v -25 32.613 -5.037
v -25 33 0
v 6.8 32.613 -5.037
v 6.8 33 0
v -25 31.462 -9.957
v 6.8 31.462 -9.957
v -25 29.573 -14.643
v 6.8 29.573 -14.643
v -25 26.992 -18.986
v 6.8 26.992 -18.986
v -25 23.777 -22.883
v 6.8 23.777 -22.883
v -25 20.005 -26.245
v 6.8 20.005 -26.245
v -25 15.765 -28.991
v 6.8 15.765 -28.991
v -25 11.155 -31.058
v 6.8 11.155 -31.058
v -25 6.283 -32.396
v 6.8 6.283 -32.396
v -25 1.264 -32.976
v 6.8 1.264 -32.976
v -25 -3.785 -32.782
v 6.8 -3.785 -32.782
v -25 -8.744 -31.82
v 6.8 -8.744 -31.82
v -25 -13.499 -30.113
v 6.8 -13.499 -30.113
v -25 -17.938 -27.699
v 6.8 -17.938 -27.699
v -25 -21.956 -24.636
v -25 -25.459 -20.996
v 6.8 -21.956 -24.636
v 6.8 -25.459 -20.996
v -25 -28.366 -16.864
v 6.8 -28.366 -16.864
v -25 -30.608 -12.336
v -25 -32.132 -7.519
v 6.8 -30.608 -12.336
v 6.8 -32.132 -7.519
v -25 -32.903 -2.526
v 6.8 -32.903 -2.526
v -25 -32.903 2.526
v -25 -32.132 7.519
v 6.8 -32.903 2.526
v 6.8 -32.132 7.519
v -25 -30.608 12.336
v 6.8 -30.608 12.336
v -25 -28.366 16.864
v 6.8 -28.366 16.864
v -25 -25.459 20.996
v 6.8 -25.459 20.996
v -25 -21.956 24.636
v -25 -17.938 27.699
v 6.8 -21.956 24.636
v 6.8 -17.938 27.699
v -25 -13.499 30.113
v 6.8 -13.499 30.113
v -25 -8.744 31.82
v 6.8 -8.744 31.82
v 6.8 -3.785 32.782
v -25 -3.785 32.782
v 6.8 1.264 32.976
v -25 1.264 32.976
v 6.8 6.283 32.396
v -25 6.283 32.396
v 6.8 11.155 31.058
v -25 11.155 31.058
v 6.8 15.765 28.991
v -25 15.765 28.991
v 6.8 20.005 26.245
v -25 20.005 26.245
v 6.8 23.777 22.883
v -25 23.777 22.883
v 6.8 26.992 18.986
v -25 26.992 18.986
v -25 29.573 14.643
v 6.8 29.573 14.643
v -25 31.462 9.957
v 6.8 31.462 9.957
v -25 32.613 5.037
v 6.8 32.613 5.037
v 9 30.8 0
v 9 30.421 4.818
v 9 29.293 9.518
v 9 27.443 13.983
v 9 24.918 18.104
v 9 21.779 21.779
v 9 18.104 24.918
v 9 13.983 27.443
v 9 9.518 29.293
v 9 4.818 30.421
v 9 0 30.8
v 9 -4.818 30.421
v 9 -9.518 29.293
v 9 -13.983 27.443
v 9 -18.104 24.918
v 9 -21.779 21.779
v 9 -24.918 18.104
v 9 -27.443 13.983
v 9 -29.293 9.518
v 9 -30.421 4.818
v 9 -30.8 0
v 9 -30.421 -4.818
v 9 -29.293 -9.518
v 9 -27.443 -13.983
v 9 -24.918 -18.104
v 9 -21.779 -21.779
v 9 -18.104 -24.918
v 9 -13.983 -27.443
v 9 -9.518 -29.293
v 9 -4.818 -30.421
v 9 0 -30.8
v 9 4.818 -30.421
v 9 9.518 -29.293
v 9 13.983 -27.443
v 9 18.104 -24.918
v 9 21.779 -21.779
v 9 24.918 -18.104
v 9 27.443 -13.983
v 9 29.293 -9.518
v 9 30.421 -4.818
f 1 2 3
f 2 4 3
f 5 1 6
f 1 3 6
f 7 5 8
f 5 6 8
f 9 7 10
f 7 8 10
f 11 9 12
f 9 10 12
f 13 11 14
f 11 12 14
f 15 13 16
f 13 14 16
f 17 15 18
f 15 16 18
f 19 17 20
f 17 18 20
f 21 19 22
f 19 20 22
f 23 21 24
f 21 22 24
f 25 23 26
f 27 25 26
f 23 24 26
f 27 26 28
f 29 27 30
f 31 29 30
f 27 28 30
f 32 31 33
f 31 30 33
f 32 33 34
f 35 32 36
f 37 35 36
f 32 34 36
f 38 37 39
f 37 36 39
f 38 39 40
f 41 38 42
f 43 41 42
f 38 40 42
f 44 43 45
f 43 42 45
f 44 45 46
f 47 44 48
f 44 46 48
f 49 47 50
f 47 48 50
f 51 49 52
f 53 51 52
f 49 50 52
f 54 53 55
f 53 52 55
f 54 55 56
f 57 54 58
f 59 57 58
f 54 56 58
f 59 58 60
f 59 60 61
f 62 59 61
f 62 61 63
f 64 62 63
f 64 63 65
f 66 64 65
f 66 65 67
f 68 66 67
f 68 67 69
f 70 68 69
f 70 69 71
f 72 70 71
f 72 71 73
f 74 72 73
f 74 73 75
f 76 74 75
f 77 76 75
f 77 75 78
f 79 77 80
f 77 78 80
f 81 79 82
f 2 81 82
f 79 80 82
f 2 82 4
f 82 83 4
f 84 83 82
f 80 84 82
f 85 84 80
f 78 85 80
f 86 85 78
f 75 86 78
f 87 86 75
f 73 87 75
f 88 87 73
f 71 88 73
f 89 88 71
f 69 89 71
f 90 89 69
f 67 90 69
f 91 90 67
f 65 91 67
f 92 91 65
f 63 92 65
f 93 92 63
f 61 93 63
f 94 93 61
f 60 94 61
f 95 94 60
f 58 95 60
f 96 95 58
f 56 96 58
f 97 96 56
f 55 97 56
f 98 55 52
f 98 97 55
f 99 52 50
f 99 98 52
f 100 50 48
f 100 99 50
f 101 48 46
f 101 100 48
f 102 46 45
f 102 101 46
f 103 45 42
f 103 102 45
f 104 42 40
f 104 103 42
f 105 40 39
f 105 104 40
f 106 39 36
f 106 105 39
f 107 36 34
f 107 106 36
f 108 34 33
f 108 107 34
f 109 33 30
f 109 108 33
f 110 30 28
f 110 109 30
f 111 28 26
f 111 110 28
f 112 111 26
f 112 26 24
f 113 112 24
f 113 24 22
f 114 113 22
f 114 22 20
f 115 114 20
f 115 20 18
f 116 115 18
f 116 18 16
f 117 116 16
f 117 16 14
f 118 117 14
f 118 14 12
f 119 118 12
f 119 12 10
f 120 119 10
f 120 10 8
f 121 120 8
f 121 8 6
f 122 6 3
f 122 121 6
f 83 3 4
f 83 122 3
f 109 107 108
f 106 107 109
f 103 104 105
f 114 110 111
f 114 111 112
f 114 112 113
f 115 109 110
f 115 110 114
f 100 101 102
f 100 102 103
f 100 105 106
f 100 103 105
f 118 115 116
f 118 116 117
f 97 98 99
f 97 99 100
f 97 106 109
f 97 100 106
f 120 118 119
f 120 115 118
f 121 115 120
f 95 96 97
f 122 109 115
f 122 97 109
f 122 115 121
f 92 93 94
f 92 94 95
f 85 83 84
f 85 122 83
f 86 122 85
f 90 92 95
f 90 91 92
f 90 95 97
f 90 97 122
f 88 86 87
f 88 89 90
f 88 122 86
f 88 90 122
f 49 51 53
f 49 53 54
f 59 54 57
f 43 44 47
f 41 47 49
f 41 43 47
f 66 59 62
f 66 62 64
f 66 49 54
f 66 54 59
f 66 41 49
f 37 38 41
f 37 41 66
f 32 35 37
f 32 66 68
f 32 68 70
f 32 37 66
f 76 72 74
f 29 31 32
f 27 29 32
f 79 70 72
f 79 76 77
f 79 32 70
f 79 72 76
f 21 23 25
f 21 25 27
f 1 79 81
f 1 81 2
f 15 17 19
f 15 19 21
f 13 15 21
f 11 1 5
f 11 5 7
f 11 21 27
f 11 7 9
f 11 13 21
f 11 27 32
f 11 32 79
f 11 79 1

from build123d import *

# Parameters (mm, degrees)
F0_R      = 33
F1_DEPTH  = 9
F2_SIZE   = 2.2
F1_FACE_R = 33
F3_DEPTH  = 25


with BuildPart() as f1:
    # F0 (on Right) → F1 (new body)
    with BuildSketch(Plane.YZ):
        Circle(F0_R)
    extrude(amount=F1_DEPTH)

    # F2
    f2_edges = [f1.edges().sort_by_distance(p)[0] for p in [
        (9, -33, 0),
    ]]
    chamfer(f2_edges, length=F2_SIZE)

    # F1_face (on face) → F3 (join)
    with BuildSketch(Plane(origin=(0, 0, 0), x_dir=(0, 1, 0), z_dir=(-1, 0, 0))):
        Circle(F1_FACE_R)
    extrude(amount=F3_DEPTH)


solid = f1.part
